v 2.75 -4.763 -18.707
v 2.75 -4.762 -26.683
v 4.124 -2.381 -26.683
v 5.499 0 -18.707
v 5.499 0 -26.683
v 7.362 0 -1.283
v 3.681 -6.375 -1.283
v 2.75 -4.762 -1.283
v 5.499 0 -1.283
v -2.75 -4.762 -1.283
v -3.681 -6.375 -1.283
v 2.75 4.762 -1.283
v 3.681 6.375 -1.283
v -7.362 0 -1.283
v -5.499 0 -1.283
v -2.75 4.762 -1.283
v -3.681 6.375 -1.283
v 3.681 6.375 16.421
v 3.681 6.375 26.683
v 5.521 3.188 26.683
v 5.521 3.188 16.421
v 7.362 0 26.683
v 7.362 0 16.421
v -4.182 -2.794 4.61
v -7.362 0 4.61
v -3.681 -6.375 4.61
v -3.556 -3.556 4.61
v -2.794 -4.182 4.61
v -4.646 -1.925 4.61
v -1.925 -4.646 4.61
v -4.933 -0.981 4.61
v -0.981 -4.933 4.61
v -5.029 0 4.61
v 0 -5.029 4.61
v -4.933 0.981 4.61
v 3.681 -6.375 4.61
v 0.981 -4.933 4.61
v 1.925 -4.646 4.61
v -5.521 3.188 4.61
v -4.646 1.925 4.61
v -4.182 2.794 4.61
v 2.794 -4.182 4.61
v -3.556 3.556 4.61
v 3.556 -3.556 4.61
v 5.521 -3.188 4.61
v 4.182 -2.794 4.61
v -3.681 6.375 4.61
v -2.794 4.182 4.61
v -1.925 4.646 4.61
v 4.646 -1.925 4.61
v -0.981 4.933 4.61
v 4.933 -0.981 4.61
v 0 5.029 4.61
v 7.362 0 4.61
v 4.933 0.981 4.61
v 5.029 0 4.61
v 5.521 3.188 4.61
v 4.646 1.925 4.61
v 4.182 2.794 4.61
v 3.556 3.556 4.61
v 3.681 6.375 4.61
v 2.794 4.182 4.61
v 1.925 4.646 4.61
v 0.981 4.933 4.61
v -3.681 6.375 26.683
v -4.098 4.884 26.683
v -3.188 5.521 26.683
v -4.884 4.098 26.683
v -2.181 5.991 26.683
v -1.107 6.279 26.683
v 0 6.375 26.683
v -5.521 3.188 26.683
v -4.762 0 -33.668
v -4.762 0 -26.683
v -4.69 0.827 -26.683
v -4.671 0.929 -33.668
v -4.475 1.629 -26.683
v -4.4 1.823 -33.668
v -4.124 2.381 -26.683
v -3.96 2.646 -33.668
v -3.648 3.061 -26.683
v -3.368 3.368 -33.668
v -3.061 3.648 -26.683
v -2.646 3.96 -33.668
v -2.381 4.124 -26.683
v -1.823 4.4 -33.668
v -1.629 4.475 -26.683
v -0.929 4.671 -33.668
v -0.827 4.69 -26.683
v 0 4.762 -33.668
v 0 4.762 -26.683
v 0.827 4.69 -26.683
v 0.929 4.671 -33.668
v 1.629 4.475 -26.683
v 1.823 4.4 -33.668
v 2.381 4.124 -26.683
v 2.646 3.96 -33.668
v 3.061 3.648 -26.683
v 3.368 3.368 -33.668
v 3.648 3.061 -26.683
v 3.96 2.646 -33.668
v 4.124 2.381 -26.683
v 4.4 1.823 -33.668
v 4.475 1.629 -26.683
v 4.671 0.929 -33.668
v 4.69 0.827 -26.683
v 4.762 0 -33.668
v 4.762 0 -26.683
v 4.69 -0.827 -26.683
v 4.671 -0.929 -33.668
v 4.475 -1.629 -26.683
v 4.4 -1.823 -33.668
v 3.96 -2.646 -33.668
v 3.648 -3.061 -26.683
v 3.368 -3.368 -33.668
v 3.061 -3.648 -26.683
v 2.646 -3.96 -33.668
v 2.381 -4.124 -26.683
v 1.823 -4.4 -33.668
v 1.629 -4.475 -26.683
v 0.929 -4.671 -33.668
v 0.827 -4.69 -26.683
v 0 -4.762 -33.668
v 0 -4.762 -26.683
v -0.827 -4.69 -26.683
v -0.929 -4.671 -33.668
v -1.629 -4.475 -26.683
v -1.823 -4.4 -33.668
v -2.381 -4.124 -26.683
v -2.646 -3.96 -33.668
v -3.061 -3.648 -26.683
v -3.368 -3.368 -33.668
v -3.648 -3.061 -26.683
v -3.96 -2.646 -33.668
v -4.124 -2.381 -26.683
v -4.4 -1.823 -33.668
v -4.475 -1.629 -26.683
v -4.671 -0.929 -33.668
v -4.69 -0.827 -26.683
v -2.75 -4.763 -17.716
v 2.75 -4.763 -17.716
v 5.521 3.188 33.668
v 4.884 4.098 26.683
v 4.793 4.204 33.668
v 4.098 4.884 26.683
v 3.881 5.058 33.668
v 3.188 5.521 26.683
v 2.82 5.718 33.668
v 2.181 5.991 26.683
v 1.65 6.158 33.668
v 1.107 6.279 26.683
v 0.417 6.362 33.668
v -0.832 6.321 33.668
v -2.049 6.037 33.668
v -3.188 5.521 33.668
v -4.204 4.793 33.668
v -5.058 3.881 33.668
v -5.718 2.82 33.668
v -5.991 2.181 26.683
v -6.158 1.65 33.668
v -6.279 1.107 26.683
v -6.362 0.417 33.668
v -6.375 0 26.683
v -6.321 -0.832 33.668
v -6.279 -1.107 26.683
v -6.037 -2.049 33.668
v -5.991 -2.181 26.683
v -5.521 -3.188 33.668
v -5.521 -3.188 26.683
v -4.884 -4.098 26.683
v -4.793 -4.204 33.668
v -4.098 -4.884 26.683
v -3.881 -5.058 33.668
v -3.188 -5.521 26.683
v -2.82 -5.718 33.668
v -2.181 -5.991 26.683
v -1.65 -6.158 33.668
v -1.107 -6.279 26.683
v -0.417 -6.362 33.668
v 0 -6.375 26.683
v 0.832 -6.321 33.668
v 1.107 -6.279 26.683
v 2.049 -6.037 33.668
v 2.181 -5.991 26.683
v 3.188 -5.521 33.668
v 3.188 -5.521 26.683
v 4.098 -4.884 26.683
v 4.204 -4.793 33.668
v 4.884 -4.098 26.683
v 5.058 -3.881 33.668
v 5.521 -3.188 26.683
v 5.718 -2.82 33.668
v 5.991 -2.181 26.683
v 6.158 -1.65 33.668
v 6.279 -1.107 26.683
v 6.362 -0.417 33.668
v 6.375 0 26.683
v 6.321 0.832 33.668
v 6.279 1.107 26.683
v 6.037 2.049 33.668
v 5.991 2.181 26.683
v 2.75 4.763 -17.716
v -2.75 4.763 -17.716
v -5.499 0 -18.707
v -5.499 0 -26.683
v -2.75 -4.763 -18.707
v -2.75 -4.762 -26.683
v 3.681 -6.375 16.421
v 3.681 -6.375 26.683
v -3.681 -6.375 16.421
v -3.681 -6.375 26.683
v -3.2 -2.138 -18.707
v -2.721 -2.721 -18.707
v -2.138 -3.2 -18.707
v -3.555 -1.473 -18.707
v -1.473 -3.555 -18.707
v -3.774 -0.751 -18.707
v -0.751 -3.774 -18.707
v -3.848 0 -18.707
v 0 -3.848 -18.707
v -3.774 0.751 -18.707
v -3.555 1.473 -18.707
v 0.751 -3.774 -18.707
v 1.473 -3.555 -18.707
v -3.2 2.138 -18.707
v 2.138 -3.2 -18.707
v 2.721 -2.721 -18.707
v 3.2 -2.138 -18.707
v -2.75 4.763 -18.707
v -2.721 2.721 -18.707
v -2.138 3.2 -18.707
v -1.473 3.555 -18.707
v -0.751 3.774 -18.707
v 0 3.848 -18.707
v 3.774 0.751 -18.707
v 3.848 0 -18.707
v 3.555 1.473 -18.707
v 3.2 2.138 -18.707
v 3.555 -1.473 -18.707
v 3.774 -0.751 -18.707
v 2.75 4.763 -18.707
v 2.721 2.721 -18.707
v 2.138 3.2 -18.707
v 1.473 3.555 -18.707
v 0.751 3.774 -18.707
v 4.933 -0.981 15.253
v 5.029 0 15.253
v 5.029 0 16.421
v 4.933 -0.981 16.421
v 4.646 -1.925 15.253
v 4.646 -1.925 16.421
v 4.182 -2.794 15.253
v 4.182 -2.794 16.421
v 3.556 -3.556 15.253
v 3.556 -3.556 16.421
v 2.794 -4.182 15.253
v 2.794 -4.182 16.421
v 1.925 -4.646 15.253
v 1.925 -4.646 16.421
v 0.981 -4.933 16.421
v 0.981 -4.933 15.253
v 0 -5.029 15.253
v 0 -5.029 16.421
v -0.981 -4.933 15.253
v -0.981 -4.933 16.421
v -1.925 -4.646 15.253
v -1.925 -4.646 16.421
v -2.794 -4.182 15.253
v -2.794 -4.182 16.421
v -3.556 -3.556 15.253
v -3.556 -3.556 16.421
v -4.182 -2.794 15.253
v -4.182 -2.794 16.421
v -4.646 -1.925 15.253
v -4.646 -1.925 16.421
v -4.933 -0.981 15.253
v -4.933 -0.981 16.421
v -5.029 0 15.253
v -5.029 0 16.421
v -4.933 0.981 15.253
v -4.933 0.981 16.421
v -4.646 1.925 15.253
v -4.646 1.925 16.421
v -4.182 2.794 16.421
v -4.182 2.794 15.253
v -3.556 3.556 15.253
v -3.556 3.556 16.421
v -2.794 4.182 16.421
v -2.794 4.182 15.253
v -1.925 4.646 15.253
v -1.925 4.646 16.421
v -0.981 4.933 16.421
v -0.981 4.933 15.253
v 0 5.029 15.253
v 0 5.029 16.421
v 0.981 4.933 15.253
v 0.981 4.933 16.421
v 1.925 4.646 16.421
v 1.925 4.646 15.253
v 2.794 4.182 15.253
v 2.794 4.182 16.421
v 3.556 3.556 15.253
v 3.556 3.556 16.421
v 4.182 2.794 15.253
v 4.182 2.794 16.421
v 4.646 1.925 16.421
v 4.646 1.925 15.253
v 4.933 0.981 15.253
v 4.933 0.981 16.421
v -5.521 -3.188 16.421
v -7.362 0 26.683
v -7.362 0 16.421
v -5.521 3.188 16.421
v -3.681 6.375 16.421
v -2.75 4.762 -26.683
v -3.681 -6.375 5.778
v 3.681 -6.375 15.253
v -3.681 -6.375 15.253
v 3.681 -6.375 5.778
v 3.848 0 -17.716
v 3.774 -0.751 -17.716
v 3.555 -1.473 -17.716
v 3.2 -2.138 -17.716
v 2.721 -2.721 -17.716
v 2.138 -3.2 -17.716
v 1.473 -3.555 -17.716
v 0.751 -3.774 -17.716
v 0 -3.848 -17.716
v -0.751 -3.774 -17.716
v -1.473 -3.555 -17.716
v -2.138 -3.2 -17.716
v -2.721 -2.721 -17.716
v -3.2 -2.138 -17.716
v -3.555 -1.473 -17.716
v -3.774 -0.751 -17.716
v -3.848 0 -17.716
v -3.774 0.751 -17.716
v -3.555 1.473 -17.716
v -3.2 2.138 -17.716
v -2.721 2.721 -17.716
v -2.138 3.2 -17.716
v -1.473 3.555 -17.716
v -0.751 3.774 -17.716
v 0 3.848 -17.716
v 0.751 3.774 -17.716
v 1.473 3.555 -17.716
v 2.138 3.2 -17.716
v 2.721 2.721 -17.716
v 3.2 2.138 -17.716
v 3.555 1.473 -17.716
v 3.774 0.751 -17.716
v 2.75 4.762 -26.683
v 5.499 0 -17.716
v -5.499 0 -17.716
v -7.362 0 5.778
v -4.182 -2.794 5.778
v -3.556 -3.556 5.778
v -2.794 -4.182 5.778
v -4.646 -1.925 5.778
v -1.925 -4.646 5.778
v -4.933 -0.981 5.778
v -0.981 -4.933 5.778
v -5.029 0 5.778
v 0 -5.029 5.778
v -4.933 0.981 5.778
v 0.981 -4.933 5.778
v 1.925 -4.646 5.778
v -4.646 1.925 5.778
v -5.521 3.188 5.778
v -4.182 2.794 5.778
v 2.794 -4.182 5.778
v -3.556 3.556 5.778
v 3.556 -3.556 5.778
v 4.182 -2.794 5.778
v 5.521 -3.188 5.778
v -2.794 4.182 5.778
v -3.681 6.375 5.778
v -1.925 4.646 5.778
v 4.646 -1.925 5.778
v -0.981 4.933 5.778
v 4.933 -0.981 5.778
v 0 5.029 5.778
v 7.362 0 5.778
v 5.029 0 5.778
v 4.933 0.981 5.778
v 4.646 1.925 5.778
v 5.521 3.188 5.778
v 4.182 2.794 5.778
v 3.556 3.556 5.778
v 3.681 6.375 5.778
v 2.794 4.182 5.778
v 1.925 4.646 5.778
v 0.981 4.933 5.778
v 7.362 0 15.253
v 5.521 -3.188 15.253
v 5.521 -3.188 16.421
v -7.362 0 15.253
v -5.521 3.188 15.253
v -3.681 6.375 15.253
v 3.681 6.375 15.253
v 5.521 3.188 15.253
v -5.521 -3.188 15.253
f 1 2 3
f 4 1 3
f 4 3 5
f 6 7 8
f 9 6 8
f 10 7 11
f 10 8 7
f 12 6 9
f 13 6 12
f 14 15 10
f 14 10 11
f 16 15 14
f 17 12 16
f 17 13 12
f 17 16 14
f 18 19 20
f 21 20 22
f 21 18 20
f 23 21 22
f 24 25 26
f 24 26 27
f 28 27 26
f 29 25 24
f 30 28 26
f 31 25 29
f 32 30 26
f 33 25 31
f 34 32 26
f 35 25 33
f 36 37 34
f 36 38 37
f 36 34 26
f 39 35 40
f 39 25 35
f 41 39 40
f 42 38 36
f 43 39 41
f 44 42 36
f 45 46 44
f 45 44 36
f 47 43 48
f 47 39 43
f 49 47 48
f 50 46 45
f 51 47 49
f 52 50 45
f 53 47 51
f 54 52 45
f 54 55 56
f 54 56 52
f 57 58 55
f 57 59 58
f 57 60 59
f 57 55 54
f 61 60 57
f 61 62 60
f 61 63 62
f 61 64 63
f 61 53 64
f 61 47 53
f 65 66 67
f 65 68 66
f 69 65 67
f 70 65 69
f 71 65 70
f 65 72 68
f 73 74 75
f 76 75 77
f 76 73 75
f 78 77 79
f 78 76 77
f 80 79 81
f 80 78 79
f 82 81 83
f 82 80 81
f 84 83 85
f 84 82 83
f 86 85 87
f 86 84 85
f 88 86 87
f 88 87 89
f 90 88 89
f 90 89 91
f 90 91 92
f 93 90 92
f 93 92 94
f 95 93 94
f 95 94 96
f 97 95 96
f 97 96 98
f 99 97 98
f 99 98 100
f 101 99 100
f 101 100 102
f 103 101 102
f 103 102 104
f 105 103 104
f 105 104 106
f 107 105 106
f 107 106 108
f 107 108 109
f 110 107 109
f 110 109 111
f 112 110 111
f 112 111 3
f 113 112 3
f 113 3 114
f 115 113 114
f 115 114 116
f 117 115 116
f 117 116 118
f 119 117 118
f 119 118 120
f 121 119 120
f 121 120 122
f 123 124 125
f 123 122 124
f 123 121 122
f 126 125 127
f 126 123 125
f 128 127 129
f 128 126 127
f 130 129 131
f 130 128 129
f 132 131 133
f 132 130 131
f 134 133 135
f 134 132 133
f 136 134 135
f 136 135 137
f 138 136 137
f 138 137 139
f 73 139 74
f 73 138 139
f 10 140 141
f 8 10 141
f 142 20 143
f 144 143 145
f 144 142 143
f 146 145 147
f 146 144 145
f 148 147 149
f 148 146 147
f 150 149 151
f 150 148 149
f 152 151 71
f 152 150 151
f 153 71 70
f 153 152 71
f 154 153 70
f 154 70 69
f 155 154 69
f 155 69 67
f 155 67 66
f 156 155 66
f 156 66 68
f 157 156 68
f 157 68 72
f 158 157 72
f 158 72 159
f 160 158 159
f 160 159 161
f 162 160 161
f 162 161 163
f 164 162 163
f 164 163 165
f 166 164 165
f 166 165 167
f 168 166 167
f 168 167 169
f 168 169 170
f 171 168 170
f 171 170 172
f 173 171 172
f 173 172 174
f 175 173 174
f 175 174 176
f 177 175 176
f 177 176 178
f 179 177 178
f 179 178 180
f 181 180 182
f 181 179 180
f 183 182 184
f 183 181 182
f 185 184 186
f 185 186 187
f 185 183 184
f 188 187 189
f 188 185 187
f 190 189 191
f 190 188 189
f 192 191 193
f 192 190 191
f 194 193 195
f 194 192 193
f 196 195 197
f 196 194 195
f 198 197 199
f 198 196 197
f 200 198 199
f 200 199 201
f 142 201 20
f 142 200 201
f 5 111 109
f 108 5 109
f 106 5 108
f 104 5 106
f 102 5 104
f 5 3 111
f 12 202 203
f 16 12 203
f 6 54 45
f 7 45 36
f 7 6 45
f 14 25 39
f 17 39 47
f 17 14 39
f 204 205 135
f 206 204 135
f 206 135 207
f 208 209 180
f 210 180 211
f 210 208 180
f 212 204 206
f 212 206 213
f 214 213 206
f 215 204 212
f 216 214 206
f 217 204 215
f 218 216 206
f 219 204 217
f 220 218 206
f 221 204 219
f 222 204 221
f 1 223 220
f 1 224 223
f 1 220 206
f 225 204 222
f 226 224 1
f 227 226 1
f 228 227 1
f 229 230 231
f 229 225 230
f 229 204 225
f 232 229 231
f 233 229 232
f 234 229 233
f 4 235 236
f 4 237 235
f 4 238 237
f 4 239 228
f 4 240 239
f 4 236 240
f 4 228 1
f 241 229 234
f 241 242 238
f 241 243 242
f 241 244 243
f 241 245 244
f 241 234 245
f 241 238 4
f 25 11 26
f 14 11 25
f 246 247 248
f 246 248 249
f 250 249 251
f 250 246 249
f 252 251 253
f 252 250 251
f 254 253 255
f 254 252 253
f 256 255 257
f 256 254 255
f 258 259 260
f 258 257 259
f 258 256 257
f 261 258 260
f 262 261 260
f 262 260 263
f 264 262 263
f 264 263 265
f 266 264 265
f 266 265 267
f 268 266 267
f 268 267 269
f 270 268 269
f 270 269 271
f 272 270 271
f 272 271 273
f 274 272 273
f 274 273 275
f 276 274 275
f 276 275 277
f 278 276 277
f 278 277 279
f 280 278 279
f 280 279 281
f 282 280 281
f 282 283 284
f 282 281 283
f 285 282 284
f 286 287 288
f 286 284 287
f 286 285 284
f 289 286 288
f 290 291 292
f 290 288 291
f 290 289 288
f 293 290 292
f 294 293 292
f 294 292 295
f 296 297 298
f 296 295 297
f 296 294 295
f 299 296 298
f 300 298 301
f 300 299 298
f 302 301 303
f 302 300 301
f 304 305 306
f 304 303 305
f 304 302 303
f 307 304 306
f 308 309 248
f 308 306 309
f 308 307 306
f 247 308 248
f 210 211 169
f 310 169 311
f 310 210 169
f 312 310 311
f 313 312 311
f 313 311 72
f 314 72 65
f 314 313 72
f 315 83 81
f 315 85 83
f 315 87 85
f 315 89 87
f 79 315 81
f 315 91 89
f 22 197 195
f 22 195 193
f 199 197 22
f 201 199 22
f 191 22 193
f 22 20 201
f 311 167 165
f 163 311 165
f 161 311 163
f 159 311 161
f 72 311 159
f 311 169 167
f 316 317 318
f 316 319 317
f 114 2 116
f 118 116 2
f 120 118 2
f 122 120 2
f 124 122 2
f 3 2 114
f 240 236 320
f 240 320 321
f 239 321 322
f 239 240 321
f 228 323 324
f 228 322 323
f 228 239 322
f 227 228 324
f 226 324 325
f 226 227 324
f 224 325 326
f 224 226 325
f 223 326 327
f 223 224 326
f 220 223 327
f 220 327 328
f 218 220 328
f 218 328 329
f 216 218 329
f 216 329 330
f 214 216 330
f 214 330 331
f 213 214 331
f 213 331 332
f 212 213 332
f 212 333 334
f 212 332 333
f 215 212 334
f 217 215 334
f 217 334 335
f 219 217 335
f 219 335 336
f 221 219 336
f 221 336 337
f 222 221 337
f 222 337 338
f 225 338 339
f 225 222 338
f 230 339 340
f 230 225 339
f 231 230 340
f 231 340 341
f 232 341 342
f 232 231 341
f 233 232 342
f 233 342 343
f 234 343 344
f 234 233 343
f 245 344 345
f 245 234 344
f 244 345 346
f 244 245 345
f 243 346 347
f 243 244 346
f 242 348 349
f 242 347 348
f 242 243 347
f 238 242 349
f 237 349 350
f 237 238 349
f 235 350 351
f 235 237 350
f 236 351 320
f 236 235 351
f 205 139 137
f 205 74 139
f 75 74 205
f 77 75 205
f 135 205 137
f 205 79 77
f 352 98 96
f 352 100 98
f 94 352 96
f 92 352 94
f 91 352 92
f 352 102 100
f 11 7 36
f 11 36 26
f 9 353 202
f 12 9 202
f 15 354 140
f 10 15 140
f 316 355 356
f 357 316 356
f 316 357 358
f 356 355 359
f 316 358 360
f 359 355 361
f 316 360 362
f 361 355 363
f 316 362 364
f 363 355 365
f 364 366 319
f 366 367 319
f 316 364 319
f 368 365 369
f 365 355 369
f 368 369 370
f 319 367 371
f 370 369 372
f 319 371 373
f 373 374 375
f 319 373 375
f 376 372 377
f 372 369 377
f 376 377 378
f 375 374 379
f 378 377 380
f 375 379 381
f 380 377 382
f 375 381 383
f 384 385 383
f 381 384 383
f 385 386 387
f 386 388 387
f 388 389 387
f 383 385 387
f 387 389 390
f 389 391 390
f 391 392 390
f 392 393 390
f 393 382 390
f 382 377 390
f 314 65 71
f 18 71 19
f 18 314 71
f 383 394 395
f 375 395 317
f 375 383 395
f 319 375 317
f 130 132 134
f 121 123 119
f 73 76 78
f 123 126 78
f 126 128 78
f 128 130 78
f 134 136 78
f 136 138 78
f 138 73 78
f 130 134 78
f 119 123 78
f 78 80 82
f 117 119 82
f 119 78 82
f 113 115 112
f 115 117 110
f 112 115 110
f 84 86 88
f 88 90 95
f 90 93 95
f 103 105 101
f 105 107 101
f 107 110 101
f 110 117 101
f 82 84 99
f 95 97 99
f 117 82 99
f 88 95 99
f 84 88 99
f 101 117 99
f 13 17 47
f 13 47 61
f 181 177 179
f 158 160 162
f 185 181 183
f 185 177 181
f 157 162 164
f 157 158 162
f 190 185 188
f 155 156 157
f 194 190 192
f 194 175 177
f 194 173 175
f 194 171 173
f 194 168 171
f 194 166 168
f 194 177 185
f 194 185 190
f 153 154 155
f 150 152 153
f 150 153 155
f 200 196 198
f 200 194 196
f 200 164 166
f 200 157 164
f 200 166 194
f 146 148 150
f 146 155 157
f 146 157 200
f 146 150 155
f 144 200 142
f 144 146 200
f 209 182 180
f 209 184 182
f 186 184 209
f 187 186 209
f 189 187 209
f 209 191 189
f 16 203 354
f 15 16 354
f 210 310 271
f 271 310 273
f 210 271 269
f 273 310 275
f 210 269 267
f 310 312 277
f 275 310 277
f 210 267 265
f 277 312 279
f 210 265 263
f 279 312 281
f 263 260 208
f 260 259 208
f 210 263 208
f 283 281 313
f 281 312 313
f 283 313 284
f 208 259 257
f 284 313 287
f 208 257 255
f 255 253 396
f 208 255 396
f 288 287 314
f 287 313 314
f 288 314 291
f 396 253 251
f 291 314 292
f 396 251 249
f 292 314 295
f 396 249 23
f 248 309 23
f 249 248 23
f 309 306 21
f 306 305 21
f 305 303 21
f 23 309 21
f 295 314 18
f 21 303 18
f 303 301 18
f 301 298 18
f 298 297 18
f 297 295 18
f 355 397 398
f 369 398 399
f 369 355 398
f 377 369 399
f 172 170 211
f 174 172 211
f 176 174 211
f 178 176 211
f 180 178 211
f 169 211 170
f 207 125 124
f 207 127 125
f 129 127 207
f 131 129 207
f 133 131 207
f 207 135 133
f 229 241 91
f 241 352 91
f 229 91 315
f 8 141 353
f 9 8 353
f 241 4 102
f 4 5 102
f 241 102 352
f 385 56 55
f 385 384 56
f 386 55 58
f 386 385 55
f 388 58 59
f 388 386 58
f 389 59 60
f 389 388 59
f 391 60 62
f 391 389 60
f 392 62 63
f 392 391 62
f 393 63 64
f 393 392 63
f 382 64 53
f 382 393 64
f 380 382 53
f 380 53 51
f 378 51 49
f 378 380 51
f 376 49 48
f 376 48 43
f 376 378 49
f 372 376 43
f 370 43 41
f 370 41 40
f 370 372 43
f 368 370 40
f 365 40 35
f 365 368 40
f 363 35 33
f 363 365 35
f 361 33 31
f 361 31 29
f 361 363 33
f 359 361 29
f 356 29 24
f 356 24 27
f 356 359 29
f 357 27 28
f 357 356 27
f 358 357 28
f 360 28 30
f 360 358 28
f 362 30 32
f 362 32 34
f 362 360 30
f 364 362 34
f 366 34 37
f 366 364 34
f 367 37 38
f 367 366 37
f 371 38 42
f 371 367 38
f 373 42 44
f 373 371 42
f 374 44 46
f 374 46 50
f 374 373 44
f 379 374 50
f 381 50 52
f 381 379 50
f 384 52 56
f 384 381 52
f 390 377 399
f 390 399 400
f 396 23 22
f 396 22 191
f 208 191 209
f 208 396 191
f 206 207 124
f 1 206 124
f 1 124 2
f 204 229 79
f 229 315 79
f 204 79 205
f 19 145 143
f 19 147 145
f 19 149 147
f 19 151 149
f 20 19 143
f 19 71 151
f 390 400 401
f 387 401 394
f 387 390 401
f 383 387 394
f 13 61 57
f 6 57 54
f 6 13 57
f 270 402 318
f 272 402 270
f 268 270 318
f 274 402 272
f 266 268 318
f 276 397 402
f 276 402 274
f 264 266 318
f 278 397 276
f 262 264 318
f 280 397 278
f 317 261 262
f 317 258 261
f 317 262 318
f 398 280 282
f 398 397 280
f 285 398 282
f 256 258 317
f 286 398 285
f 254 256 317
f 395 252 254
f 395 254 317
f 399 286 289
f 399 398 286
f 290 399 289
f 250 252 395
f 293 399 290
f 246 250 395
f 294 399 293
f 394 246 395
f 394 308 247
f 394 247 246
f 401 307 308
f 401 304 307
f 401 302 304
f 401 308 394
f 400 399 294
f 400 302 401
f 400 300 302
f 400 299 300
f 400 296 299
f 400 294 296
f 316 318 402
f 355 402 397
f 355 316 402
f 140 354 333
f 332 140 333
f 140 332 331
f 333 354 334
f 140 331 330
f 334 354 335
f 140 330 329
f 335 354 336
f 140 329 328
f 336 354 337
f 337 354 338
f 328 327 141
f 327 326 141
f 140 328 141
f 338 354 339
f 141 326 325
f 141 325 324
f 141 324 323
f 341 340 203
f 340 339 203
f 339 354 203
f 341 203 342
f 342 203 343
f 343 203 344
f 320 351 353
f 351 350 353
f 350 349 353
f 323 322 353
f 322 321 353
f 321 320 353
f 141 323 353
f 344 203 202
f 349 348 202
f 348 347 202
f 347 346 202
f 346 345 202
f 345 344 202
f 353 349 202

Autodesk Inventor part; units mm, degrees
sketch "Sketch1" plane through (0, 0, 0) normal (0, 0, 1) x (1, 0, 0)
  line L0 (-10.3063, 0) -> (10.3063, 0) projected
  line L1 (0, -8.9256) -> (0, 8.9256) projected
  line L2 (3.6808, 6.3754) -> (7.3617, 0)
  line L3 (7.3617, 0) -> (3.6808, -6.3754)
  line L4 (3.6808, -6.3754) -> (-3.6808, -6.3754)
  line L5 (-3.6808, -6.3754) -> (-7.3617, 0)
  line L6 (-7.3617, 0) -> (-3.6808, 6.3754)
  line L7 (-3.6808, 6.3754) -> (3.6808, 6.3754)
  point P0 (0, 0)
  point P1 (0, 0)
  point P2 (0, 6.3754)
  dimension "d0" = 12.7508
extrude "Base" add sketch "Sketch1" along normal mid plane 67.3354
sketch "Sketch2" plane through (0, 0, 33.6677) normal (0, 0, 1) x (1, 0, 0)
  line L0 (7.3617, 0) -> (3.6808, -6.3754) projected
  line L1 (3.6808, 6.3754) -> (7.3617, 0) projected
  line L2 (-3.6808, 6.3754) -> (3.6808, 6.3754) projected
  line L3 (-7.3617, 0) -> (-3.6808, 6.3754) projected
  line L4 (-3.6808, -6.3754) -> (-7.3617, 0) projected
  line L5 (3.6808, -6.3754) -> (-3.6808, -6.3754) projected
  circle A0 centre (0, 0) radius 6.3754
extrude "Bearing Fit" cut sketch "Sketch2" against normal blind 6.985 contours L0 A0 L1 | L0 L5 A0 | A0 L2 L1 | L5 L4 A0 | A0 L3 L2 | L4 L3 A0
mirror "Mirror1" about plane through (0, 0, 0) normal (0, 0, 1) of "Bearing Fit"
sketch "Sketch4" plane through (0, 0, -33.6677) normal (0, 0, -1) x (-1, 0, 0)
  circle A0 centre (0, 0) radius 6.3754 projected
  circle A1 centre (0, 0) radius 4.7625
  dimension "d7" = 9.525
extrude "Extrusion4" cut sketch "Sketch4" against normal up to surface (6.985 mm away)
sketch "Sketch5" plane through (3.6808, 6.3754, -26.6827) normal (0, 0, -1) x (-1, 0, 0)
  line L0 (7.3617, 0) -> (11.0425, -6.3754) projected
  line L1 (0, 0) -> (7.3617, 0) projected
  line L2 (-3.6808, -6.3754) -> (0, 0) projected
  line L3 (0, -12.7508) -> (-3.6808, -6.3754) projected
  line L4 (7.3617, -12.7508) -> (0, -12.7508) projected
  line L5 (11.0425, -6.3754) -> (7.3617, -12.7508) projected
  line L6 (6.4305, -1.6129) -> (9.1801, -6.3754)
  line L7 (9.1801, -6.3754) -> (6.4305, -11.1379)
  line L8 (6.4305, -11.1379) -> (0.9312, -11.1379)
  line L9 (0.9312, -11.1379) -> (-1.8184, -6.3754)
  line L10 (-1.8184, -6.3754) -> (0.9312, -1.6129)
  line L11 (0.9312, -1.6129) -> (6.4305, -1.6129)
  dimension "d10" = 9.525
extrude ".375 step down" cut sketch "Sketch5" against normal blind 25.4
ref_plane "Work Plane1" through (0, 0, 15.2527) normal (0, 0, 1) x (1, 0, 0)
sketch "Sketch6" plane through (0, 0, 15.2527) normal (0, 0, 1) x (1, 0, 0)
  line L0 (-3.6808, 6.3754) -> (0, 6.3754) projected
  line L1 (-5.5213, 3.1877) -> (-3.6808, 6.3754) projected
  line L2 (3.6808, 6.3754) -> (5.5213, 3.1877) projected
  line L3 (0, 6.3754) -> (3.6808, 6.3754) projected
  line L4 (5.5213, 3.1877) -> (7.3617, 0) projected
  line L5 (7.3617, 0) -> (5.5213, -3.1877) projected
  line L6 (5.5213, -3.1877) -> (3.6808, -6.3754) projected
  line L7 (0, -6.3754) -> (-3.6808, -6.3754) projected
  line L8 (-3.6808, -6.3754) -> (-5.5213, -3.1877) projected
  line L9 (3.6808, -6.3754) -> (0, -6.3754) projected
  line L10 (-7.3617, 0) -> (-5.5213, 3.1877) projected
  line L11 (-5.5213, -3.1877) -> (-7.3617, 0) projected
  circle A0 centre (0, 0) radius 5.0292
  point P0 (0, 0)
  dimension "d14" = 10.0584
extrude "Extrusion6" cut sketch "Sketch6" along normal blind 1.1684
ref_plane "Work Plane2" through (0, 0, 5.7785) normal (0, 0, 1) x (1, 0, 0)
sketch "Sketch7" plane through (0, 0, 5.7785) normal (0, 0, 1) x (1, 0, 0)
  line L0 (0, 6.3754) -> (3.6808, 6.3754) projected
  line L1 (3.6808, 6.3754) -> (5.5213, 3.1877) projected
  line L2 (5.5213, 3.1877) -> (7.3617, 0) projected
  line L3 (7.3617, 0) -> (5.5213, -3.1877) projected
  line L4 (5.5213, -3.1877) -> (3.6808, -6.3754) projected
  line L5 (3.6808, -6.3754) -> (0, -6.3754) projected
  line L6 (0, -6.3754) -> (-3.6808, -6.3754) projected
  line L7 (-3.6808, -6.3754) -> (-5.5213, -3.1877) projected
  line L8 (-7.3617, 0) -> (-5.5213, 3.1877) projected
  line L9 (-5.5213, 3.1877) -> (-3.6808, 6.3754) projected
  line L10 (-3.6808, 6.3754) -> (0, 6.3754) projected
  circle A0 centre (0, 0) radius 5.0292
  circle A1 centre (0, 0) radius 7.3617
  point P0 (0, 0)
  dimension "d18" = 10.0584
extrude "Extrusion7" cut sketch "Sketch7" against normal blind 1.1684
ref_plane "Work Plane3" through (0, 0, -18.7071) normal (0, 0, 1) x (1, 0, 0)
sketch "Sketch8" plane through (0, 0, -18.7071) normal (0, 0, 1) x (1, 0, 0)
  circle A0 centre (0, 0) radius 3.8481
  line L0 (-2.7496, 4.7625) -> (2.7496, 4.7625) projected
  line L1 (-5.4993, 0) -> (-2.7496, 4.7625) projected
  circle A1 centre (0, 0) radius 5.4993
  point P0 (0, 0)
  dimension "d22" = 7.6962
extrude "Extrusion8" cut sketch "Sketch8" along normal blind 0.9906
properties part number "shaft - step down No. 1 - 0.5 hex" material "Steel"
